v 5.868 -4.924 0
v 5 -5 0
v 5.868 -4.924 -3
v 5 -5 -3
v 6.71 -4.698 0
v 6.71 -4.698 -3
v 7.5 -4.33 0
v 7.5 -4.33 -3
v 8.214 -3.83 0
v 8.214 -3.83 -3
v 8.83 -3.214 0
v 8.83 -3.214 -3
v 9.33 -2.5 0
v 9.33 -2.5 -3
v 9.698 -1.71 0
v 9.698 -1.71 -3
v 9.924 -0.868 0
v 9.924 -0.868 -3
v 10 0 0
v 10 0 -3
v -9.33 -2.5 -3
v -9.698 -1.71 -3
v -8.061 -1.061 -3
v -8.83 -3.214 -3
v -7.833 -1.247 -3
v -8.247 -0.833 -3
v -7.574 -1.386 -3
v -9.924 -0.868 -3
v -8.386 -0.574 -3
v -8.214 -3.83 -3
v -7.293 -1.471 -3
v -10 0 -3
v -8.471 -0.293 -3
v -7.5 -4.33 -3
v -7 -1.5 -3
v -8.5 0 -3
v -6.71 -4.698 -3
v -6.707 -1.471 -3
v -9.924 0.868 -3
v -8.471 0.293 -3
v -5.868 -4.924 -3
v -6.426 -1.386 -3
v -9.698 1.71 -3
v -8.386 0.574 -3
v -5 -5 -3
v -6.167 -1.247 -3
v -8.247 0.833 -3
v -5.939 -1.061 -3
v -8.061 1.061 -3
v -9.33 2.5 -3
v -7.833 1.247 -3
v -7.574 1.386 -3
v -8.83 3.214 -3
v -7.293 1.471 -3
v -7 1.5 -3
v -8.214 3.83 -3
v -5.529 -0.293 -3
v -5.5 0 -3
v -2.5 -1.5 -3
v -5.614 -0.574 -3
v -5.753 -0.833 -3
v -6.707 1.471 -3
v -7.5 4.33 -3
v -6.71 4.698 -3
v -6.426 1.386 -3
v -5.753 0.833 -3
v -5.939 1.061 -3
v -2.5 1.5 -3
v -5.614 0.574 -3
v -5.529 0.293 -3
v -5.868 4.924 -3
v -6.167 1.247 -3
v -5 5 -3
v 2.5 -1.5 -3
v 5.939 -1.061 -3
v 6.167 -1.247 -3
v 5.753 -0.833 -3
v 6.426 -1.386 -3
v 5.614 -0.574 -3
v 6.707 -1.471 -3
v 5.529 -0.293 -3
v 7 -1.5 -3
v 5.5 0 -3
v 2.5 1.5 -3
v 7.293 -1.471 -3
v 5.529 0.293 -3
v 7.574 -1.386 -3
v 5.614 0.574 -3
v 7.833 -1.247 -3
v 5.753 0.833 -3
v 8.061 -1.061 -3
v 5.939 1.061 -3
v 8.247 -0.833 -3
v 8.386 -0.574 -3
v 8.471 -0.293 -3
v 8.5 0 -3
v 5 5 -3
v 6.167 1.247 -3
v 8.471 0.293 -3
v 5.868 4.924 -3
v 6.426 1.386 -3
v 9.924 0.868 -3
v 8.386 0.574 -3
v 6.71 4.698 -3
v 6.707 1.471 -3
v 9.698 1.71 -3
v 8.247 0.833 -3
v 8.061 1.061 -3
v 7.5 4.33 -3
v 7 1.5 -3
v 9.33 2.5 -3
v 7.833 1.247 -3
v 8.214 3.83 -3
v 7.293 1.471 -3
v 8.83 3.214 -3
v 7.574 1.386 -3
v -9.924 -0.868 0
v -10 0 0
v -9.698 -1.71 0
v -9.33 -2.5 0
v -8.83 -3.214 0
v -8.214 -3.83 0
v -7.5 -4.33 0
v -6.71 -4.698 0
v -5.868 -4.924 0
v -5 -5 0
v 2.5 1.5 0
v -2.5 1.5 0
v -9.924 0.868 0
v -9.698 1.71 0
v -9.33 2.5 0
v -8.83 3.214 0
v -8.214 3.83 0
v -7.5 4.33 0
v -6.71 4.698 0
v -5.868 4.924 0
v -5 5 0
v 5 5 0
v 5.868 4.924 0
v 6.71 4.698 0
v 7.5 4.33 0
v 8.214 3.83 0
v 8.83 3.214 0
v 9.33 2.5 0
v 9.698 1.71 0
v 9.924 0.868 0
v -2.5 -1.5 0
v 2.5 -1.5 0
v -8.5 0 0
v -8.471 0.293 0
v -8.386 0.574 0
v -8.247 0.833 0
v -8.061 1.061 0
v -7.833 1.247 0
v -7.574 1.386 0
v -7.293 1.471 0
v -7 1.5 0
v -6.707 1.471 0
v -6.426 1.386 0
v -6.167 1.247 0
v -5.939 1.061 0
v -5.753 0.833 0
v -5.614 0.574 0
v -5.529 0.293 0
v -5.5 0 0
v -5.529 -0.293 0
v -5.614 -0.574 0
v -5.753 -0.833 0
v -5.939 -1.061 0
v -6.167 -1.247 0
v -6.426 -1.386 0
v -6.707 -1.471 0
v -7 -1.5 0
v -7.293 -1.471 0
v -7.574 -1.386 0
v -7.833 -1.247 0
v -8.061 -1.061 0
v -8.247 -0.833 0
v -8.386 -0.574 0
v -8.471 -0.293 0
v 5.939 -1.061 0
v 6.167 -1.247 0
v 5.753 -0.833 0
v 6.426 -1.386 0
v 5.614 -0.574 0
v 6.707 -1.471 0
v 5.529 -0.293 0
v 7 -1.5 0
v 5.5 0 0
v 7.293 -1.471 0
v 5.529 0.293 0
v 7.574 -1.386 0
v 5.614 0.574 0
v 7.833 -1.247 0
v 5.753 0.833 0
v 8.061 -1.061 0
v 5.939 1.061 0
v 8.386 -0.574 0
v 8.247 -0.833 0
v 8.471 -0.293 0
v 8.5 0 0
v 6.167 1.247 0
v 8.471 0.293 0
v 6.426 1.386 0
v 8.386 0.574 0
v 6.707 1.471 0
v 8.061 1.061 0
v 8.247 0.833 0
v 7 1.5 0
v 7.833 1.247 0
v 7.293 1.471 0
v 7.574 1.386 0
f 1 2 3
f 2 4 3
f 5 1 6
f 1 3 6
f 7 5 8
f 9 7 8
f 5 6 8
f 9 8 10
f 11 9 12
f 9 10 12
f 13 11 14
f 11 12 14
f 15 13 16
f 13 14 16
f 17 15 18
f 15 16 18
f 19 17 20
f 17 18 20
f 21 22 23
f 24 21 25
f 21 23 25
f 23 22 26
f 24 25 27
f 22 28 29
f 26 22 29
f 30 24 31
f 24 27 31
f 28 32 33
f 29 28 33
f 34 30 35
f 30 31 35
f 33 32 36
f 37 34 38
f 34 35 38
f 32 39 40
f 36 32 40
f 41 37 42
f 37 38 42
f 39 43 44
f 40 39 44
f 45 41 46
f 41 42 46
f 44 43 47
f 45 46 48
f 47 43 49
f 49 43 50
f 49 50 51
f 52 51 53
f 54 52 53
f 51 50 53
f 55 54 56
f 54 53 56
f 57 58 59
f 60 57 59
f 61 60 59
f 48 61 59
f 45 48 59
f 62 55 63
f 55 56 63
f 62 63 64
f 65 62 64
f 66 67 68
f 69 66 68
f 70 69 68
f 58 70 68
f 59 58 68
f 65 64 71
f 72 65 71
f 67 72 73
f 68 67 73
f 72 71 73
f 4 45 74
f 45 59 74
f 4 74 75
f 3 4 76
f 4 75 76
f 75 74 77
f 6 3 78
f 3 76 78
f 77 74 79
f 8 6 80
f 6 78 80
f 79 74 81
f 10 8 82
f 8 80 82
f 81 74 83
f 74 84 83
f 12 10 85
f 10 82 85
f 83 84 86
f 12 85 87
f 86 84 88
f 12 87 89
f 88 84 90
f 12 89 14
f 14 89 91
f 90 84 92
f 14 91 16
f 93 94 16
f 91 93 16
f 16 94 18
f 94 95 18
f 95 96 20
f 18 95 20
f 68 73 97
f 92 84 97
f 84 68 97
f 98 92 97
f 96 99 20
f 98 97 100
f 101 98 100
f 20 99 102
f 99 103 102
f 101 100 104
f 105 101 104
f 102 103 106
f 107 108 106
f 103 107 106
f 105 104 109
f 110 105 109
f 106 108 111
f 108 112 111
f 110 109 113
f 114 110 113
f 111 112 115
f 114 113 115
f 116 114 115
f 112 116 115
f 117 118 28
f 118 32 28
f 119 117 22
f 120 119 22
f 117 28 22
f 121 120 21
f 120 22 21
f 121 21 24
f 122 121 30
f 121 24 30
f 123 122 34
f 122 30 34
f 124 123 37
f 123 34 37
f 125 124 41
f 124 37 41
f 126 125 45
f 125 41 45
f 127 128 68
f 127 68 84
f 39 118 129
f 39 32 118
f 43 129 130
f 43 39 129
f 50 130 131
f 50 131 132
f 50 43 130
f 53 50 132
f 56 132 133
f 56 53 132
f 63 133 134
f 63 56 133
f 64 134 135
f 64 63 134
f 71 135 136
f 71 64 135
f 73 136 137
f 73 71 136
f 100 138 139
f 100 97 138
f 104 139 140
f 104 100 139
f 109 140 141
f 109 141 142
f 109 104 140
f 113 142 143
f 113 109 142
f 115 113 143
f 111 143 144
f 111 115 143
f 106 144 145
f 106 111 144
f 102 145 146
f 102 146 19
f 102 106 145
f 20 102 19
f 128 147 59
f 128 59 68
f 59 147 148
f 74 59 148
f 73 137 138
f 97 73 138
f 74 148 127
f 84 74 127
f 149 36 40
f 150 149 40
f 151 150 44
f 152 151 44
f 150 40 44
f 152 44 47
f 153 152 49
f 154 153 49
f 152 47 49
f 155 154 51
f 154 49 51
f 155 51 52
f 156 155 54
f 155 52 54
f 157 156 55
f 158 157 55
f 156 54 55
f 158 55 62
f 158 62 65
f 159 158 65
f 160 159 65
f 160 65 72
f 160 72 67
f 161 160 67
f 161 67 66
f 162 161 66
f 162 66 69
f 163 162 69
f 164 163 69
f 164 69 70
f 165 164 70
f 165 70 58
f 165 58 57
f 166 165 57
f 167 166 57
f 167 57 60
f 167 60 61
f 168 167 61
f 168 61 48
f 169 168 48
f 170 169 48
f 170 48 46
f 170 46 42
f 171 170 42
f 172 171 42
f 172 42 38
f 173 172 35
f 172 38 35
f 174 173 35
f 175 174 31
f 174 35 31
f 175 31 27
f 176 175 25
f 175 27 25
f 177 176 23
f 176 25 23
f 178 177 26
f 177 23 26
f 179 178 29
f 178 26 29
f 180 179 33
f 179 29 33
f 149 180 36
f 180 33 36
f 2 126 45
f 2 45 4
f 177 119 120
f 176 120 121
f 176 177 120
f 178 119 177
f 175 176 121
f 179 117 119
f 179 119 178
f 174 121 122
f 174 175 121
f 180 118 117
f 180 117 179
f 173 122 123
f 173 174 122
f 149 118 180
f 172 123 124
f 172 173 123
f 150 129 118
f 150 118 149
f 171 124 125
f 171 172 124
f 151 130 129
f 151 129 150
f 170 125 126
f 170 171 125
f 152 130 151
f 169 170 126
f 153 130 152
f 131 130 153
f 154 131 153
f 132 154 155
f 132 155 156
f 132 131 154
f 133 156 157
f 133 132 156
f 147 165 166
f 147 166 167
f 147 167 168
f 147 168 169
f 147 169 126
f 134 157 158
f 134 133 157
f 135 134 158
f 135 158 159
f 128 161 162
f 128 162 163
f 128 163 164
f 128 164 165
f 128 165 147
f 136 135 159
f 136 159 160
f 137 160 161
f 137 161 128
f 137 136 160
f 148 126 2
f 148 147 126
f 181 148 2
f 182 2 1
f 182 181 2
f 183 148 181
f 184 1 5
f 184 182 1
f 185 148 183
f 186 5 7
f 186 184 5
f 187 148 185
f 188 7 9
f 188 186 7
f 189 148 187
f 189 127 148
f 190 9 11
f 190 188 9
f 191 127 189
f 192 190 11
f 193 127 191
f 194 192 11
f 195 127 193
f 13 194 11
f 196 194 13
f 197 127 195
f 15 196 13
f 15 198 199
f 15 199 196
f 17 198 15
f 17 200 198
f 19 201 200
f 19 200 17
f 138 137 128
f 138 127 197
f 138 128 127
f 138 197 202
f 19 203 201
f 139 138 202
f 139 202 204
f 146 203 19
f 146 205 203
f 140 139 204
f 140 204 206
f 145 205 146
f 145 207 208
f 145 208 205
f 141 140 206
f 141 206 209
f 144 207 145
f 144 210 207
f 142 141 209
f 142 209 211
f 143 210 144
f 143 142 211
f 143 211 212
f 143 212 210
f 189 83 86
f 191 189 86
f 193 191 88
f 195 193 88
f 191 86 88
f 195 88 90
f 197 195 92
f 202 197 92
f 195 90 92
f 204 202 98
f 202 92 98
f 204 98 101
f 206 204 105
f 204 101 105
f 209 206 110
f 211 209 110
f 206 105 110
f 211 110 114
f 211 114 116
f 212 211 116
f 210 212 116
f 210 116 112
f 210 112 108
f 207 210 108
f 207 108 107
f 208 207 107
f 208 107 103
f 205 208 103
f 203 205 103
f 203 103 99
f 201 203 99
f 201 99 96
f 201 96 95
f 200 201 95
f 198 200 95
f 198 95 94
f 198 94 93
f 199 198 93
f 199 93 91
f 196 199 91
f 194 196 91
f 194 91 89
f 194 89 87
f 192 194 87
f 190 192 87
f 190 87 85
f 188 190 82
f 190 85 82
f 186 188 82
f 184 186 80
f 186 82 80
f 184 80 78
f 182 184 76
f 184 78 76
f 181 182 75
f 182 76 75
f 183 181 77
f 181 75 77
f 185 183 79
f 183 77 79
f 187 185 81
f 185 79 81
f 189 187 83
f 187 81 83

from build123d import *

# Parameters (mm, degrees)
F0_W     = 20
F0_H     = 10
F0_W_2   = 5
F0_H_2   = 3
F1_DEPTH = 3
F2_R     = 4.99999
F4_D     = 3


# Not quite as in the source:
# - a fillet or chamfer is up to 0.001 mm smaller than in the source, because OpenCascade refuses the exact size


with BuildPart() as f1:
    # F0 (on Top) → F1 (new body)
    with BuildSketch(Plane.XY):
        Rectangle(F0_W, F0_H)
        Rectangle(F0_W_2, F0_H_2, mode=Mode.SUBTRACT)
    extrude(amount=-F1_DEPTH)

    # F2 (radius 5 in the source; OpenCascade refuses exactly that, so slightly less here)
    f2_edges = [f1.edges().sort_by_distance(p)[0] for p in [
        (-10, -5, -1.5),
        (-10, 5, -1.5),
        (10, -5, -1.5),
        (10, 5, -1.5),
    ]]
    fillet(f2_edges, radius=F2_R)

    # F4 (through all)
    with Locations(Plane.XY):
        with Locations((-7, 0), (7, 0)):
            Hole(F4_D / 2)


solid = f1.part
